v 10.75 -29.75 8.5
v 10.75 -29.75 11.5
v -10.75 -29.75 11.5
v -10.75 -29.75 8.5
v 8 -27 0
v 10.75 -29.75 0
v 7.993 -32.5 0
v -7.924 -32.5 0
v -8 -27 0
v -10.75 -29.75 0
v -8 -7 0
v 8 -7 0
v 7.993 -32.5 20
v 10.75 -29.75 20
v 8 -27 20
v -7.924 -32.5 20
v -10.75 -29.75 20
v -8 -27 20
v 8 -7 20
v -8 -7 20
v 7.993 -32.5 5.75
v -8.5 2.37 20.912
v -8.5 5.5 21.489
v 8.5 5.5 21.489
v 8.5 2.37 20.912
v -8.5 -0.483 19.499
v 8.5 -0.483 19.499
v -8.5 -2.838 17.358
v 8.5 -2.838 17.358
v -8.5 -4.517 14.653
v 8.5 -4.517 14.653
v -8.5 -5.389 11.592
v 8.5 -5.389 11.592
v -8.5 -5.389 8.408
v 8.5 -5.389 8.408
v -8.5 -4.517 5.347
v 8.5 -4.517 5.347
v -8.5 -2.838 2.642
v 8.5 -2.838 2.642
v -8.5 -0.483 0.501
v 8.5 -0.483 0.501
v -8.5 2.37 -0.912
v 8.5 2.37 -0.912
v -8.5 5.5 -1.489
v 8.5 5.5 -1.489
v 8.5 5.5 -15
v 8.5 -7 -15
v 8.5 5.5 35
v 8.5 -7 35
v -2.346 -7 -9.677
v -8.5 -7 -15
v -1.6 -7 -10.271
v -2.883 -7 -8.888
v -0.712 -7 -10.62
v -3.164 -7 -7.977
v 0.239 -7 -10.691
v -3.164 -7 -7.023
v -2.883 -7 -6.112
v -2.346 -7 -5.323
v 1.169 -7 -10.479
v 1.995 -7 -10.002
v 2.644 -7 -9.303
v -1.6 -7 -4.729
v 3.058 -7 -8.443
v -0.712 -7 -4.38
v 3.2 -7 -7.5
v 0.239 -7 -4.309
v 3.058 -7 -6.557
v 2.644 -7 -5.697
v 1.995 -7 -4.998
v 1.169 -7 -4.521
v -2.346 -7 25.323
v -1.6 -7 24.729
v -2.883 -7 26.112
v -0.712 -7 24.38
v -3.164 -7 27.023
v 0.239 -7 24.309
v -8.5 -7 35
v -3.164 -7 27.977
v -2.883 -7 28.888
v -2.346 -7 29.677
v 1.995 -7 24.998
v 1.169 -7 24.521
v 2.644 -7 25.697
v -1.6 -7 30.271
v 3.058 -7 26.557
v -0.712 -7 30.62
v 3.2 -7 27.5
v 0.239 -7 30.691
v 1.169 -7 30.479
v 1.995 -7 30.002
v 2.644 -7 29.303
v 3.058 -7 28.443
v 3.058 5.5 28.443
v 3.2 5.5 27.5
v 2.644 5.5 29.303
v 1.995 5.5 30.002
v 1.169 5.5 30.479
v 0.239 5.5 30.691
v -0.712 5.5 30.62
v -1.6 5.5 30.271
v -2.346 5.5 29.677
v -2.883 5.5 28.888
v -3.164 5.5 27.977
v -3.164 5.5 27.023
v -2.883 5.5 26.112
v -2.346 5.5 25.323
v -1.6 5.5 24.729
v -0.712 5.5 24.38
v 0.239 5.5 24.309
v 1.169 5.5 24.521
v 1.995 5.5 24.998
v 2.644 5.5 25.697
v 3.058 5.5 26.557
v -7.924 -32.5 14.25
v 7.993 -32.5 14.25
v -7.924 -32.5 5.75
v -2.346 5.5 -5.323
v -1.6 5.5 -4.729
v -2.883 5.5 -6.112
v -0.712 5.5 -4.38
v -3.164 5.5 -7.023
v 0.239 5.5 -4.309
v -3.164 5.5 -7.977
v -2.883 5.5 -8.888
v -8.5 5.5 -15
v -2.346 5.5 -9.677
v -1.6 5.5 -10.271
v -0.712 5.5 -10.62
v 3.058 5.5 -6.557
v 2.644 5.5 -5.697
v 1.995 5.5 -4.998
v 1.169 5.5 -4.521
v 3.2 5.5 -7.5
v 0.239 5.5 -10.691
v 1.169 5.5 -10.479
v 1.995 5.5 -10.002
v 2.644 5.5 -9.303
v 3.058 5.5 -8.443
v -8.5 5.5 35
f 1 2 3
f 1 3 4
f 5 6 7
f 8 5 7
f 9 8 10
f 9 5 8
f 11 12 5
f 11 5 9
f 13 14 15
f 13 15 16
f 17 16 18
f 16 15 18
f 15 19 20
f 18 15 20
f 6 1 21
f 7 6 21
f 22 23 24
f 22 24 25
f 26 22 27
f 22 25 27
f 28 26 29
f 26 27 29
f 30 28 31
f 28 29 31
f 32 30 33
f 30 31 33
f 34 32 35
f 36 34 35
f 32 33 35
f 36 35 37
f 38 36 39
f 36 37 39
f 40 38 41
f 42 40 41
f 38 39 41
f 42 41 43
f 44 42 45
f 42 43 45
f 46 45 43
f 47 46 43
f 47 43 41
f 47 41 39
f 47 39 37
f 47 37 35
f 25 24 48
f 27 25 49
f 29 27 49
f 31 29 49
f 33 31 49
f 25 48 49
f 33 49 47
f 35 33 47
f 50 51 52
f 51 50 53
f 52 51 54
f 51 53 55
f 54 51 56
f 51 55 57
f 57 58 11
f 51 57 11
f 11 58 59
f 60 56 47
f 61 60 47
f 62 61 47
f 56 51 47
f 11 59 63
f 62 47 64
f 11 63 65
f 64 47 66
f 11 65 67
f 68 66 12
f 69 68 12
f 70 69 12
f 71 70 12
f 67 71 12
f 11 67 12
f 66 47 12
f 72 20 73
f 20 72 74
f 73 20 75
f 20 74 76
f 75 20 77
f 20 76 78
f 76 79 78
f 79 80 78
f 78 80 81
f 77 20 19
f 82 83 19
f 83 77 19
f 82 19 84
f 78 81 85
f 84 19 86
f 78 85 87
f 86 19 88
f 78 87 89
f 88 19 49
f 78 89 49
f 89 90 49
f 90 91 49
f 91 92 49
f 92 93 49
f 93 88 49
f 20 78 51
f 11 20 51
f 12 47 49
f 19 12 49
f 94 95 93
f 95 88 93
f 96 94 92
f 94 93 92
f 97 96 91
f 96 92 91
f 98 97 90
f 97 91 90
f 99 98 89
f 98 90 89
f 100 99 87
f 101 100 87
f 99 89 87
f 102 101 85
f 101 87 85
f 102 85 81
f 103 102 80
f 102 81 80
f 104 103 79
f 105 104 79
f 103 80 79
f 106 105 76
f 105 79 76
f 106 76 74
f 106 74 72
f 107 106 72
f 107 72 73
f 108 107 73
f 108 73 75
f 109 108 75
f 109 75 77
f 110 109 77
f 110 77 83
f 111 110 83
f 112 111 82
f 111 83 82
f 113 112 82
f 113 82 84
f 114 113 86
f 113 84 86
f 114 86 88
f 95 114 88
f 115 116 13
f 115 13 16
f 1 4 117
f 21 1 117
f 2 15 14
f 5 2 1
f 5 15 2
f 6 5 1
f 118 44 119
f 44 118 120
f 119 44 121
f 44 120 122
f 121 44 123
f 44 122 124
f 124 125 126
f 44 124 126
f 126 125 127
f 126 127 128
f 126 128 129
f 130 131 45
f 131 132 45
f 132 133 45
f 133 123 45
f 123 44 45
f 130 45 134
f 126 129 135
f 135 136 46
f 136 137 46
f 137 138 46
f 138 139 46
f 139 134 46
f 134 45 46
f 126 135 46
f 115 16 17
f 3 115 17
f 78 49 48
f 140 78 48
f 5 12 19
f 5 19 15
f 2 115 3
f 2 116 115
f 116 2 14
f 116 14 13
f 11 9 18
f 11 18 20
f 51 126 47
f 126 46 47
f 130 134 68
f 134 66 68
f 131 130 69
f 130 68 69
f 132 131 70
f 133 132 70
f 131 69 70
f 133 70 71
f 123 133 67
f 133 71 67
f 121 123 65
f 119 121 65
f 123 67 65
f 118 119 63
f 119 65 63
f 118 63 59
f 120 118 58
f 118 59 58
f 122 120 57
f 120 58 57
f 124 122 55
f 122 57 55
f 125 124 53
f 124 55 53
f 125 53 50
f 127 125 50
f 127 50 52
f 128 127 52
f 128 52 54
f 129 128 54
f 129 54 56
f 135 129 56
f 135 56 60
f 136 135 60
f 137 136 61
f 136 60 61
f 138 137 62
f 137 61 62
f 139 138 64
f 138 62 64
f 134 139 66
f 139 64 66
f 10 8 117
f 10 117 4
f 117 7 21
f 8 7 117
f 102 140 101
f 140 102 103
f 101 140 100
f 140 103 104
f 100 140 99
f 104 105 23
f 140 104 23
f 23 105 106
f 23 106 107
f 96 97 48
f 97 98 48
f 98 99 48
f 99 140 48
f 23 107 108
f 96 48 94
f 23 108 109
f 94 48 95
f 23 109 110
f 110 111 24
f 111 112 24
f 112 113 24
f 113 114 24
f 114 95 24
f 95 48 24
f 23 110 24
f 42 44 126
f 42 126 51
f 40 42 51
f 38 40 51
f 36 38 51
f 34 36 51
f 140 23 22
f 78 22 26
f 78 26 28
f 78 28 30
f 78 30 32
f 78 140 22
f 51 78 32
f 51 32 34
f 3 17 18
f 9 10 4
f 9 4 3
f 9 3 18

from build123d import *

# Parameters (mm, degrees)
PAD_DEPTH       = 20
POCKET_DEPTH    = 15
PAD001_DEPTH    = 8.5
SKETCH005_R     = 3.2
POCKET001_DEPTH = 12.5


with BuildPart() as part:
    # Sketch002 → Pad (new body)
    with BuildSketch(Plane.XY):
        Polygon((8, -7), (8, -27), (10.75, -29.75), (7.993292, -32.5), (-7.924012, -32.5), (-10.75, -29.75), (-8, -27), (-8, -7), align=None)
    extrude(amount=PAD_DEPTH)

    # Sketch004 → Pocket (cut, symmetric)
    with BuildSketch(Plane.YZ):
        Polygon((-29.75, 11.5), (-29.75, 8.5), (-33.75, 4.5), (-33.75, 15.5), align=None)
    extrude(amount=POCKET_DEPTH, both=True, mode=Mode.SUBTRACT)

    # Sketch → Pad001 (join, symmetric)
    with BuildSketch(Plane.YZ):
        with BuildLine():
            ThreePointArc((5.5, 21.489125), (-5.5, 10), (5.5, -1.489125))
            Line((5.5, -1.489125), (5.5, -15))
            Line((5.5, -15), (-7, -15))
            Line((-7, -15), (-7, 35))
            Line((-7, 35), (5.5, 35))
            Line((5.5, 35), (5.5, 21.489125))
        make_face()
    extrude(amount=PAD001_DEPTH, both=True)

    # Sketch005 → Pocket001 (cut, symmetric)
    with BuildSketch(Plane.XZ):
        with Locations((0, 27.5)):
            Circle(SKETCH005_R)
        with Locations((0, -7.5)):
            Circle(SKETCH005_R)
    extrude(amount=POCKET001_DEPTH, both=True, mode=Mode.SUBTRACT)


solid = part.part
